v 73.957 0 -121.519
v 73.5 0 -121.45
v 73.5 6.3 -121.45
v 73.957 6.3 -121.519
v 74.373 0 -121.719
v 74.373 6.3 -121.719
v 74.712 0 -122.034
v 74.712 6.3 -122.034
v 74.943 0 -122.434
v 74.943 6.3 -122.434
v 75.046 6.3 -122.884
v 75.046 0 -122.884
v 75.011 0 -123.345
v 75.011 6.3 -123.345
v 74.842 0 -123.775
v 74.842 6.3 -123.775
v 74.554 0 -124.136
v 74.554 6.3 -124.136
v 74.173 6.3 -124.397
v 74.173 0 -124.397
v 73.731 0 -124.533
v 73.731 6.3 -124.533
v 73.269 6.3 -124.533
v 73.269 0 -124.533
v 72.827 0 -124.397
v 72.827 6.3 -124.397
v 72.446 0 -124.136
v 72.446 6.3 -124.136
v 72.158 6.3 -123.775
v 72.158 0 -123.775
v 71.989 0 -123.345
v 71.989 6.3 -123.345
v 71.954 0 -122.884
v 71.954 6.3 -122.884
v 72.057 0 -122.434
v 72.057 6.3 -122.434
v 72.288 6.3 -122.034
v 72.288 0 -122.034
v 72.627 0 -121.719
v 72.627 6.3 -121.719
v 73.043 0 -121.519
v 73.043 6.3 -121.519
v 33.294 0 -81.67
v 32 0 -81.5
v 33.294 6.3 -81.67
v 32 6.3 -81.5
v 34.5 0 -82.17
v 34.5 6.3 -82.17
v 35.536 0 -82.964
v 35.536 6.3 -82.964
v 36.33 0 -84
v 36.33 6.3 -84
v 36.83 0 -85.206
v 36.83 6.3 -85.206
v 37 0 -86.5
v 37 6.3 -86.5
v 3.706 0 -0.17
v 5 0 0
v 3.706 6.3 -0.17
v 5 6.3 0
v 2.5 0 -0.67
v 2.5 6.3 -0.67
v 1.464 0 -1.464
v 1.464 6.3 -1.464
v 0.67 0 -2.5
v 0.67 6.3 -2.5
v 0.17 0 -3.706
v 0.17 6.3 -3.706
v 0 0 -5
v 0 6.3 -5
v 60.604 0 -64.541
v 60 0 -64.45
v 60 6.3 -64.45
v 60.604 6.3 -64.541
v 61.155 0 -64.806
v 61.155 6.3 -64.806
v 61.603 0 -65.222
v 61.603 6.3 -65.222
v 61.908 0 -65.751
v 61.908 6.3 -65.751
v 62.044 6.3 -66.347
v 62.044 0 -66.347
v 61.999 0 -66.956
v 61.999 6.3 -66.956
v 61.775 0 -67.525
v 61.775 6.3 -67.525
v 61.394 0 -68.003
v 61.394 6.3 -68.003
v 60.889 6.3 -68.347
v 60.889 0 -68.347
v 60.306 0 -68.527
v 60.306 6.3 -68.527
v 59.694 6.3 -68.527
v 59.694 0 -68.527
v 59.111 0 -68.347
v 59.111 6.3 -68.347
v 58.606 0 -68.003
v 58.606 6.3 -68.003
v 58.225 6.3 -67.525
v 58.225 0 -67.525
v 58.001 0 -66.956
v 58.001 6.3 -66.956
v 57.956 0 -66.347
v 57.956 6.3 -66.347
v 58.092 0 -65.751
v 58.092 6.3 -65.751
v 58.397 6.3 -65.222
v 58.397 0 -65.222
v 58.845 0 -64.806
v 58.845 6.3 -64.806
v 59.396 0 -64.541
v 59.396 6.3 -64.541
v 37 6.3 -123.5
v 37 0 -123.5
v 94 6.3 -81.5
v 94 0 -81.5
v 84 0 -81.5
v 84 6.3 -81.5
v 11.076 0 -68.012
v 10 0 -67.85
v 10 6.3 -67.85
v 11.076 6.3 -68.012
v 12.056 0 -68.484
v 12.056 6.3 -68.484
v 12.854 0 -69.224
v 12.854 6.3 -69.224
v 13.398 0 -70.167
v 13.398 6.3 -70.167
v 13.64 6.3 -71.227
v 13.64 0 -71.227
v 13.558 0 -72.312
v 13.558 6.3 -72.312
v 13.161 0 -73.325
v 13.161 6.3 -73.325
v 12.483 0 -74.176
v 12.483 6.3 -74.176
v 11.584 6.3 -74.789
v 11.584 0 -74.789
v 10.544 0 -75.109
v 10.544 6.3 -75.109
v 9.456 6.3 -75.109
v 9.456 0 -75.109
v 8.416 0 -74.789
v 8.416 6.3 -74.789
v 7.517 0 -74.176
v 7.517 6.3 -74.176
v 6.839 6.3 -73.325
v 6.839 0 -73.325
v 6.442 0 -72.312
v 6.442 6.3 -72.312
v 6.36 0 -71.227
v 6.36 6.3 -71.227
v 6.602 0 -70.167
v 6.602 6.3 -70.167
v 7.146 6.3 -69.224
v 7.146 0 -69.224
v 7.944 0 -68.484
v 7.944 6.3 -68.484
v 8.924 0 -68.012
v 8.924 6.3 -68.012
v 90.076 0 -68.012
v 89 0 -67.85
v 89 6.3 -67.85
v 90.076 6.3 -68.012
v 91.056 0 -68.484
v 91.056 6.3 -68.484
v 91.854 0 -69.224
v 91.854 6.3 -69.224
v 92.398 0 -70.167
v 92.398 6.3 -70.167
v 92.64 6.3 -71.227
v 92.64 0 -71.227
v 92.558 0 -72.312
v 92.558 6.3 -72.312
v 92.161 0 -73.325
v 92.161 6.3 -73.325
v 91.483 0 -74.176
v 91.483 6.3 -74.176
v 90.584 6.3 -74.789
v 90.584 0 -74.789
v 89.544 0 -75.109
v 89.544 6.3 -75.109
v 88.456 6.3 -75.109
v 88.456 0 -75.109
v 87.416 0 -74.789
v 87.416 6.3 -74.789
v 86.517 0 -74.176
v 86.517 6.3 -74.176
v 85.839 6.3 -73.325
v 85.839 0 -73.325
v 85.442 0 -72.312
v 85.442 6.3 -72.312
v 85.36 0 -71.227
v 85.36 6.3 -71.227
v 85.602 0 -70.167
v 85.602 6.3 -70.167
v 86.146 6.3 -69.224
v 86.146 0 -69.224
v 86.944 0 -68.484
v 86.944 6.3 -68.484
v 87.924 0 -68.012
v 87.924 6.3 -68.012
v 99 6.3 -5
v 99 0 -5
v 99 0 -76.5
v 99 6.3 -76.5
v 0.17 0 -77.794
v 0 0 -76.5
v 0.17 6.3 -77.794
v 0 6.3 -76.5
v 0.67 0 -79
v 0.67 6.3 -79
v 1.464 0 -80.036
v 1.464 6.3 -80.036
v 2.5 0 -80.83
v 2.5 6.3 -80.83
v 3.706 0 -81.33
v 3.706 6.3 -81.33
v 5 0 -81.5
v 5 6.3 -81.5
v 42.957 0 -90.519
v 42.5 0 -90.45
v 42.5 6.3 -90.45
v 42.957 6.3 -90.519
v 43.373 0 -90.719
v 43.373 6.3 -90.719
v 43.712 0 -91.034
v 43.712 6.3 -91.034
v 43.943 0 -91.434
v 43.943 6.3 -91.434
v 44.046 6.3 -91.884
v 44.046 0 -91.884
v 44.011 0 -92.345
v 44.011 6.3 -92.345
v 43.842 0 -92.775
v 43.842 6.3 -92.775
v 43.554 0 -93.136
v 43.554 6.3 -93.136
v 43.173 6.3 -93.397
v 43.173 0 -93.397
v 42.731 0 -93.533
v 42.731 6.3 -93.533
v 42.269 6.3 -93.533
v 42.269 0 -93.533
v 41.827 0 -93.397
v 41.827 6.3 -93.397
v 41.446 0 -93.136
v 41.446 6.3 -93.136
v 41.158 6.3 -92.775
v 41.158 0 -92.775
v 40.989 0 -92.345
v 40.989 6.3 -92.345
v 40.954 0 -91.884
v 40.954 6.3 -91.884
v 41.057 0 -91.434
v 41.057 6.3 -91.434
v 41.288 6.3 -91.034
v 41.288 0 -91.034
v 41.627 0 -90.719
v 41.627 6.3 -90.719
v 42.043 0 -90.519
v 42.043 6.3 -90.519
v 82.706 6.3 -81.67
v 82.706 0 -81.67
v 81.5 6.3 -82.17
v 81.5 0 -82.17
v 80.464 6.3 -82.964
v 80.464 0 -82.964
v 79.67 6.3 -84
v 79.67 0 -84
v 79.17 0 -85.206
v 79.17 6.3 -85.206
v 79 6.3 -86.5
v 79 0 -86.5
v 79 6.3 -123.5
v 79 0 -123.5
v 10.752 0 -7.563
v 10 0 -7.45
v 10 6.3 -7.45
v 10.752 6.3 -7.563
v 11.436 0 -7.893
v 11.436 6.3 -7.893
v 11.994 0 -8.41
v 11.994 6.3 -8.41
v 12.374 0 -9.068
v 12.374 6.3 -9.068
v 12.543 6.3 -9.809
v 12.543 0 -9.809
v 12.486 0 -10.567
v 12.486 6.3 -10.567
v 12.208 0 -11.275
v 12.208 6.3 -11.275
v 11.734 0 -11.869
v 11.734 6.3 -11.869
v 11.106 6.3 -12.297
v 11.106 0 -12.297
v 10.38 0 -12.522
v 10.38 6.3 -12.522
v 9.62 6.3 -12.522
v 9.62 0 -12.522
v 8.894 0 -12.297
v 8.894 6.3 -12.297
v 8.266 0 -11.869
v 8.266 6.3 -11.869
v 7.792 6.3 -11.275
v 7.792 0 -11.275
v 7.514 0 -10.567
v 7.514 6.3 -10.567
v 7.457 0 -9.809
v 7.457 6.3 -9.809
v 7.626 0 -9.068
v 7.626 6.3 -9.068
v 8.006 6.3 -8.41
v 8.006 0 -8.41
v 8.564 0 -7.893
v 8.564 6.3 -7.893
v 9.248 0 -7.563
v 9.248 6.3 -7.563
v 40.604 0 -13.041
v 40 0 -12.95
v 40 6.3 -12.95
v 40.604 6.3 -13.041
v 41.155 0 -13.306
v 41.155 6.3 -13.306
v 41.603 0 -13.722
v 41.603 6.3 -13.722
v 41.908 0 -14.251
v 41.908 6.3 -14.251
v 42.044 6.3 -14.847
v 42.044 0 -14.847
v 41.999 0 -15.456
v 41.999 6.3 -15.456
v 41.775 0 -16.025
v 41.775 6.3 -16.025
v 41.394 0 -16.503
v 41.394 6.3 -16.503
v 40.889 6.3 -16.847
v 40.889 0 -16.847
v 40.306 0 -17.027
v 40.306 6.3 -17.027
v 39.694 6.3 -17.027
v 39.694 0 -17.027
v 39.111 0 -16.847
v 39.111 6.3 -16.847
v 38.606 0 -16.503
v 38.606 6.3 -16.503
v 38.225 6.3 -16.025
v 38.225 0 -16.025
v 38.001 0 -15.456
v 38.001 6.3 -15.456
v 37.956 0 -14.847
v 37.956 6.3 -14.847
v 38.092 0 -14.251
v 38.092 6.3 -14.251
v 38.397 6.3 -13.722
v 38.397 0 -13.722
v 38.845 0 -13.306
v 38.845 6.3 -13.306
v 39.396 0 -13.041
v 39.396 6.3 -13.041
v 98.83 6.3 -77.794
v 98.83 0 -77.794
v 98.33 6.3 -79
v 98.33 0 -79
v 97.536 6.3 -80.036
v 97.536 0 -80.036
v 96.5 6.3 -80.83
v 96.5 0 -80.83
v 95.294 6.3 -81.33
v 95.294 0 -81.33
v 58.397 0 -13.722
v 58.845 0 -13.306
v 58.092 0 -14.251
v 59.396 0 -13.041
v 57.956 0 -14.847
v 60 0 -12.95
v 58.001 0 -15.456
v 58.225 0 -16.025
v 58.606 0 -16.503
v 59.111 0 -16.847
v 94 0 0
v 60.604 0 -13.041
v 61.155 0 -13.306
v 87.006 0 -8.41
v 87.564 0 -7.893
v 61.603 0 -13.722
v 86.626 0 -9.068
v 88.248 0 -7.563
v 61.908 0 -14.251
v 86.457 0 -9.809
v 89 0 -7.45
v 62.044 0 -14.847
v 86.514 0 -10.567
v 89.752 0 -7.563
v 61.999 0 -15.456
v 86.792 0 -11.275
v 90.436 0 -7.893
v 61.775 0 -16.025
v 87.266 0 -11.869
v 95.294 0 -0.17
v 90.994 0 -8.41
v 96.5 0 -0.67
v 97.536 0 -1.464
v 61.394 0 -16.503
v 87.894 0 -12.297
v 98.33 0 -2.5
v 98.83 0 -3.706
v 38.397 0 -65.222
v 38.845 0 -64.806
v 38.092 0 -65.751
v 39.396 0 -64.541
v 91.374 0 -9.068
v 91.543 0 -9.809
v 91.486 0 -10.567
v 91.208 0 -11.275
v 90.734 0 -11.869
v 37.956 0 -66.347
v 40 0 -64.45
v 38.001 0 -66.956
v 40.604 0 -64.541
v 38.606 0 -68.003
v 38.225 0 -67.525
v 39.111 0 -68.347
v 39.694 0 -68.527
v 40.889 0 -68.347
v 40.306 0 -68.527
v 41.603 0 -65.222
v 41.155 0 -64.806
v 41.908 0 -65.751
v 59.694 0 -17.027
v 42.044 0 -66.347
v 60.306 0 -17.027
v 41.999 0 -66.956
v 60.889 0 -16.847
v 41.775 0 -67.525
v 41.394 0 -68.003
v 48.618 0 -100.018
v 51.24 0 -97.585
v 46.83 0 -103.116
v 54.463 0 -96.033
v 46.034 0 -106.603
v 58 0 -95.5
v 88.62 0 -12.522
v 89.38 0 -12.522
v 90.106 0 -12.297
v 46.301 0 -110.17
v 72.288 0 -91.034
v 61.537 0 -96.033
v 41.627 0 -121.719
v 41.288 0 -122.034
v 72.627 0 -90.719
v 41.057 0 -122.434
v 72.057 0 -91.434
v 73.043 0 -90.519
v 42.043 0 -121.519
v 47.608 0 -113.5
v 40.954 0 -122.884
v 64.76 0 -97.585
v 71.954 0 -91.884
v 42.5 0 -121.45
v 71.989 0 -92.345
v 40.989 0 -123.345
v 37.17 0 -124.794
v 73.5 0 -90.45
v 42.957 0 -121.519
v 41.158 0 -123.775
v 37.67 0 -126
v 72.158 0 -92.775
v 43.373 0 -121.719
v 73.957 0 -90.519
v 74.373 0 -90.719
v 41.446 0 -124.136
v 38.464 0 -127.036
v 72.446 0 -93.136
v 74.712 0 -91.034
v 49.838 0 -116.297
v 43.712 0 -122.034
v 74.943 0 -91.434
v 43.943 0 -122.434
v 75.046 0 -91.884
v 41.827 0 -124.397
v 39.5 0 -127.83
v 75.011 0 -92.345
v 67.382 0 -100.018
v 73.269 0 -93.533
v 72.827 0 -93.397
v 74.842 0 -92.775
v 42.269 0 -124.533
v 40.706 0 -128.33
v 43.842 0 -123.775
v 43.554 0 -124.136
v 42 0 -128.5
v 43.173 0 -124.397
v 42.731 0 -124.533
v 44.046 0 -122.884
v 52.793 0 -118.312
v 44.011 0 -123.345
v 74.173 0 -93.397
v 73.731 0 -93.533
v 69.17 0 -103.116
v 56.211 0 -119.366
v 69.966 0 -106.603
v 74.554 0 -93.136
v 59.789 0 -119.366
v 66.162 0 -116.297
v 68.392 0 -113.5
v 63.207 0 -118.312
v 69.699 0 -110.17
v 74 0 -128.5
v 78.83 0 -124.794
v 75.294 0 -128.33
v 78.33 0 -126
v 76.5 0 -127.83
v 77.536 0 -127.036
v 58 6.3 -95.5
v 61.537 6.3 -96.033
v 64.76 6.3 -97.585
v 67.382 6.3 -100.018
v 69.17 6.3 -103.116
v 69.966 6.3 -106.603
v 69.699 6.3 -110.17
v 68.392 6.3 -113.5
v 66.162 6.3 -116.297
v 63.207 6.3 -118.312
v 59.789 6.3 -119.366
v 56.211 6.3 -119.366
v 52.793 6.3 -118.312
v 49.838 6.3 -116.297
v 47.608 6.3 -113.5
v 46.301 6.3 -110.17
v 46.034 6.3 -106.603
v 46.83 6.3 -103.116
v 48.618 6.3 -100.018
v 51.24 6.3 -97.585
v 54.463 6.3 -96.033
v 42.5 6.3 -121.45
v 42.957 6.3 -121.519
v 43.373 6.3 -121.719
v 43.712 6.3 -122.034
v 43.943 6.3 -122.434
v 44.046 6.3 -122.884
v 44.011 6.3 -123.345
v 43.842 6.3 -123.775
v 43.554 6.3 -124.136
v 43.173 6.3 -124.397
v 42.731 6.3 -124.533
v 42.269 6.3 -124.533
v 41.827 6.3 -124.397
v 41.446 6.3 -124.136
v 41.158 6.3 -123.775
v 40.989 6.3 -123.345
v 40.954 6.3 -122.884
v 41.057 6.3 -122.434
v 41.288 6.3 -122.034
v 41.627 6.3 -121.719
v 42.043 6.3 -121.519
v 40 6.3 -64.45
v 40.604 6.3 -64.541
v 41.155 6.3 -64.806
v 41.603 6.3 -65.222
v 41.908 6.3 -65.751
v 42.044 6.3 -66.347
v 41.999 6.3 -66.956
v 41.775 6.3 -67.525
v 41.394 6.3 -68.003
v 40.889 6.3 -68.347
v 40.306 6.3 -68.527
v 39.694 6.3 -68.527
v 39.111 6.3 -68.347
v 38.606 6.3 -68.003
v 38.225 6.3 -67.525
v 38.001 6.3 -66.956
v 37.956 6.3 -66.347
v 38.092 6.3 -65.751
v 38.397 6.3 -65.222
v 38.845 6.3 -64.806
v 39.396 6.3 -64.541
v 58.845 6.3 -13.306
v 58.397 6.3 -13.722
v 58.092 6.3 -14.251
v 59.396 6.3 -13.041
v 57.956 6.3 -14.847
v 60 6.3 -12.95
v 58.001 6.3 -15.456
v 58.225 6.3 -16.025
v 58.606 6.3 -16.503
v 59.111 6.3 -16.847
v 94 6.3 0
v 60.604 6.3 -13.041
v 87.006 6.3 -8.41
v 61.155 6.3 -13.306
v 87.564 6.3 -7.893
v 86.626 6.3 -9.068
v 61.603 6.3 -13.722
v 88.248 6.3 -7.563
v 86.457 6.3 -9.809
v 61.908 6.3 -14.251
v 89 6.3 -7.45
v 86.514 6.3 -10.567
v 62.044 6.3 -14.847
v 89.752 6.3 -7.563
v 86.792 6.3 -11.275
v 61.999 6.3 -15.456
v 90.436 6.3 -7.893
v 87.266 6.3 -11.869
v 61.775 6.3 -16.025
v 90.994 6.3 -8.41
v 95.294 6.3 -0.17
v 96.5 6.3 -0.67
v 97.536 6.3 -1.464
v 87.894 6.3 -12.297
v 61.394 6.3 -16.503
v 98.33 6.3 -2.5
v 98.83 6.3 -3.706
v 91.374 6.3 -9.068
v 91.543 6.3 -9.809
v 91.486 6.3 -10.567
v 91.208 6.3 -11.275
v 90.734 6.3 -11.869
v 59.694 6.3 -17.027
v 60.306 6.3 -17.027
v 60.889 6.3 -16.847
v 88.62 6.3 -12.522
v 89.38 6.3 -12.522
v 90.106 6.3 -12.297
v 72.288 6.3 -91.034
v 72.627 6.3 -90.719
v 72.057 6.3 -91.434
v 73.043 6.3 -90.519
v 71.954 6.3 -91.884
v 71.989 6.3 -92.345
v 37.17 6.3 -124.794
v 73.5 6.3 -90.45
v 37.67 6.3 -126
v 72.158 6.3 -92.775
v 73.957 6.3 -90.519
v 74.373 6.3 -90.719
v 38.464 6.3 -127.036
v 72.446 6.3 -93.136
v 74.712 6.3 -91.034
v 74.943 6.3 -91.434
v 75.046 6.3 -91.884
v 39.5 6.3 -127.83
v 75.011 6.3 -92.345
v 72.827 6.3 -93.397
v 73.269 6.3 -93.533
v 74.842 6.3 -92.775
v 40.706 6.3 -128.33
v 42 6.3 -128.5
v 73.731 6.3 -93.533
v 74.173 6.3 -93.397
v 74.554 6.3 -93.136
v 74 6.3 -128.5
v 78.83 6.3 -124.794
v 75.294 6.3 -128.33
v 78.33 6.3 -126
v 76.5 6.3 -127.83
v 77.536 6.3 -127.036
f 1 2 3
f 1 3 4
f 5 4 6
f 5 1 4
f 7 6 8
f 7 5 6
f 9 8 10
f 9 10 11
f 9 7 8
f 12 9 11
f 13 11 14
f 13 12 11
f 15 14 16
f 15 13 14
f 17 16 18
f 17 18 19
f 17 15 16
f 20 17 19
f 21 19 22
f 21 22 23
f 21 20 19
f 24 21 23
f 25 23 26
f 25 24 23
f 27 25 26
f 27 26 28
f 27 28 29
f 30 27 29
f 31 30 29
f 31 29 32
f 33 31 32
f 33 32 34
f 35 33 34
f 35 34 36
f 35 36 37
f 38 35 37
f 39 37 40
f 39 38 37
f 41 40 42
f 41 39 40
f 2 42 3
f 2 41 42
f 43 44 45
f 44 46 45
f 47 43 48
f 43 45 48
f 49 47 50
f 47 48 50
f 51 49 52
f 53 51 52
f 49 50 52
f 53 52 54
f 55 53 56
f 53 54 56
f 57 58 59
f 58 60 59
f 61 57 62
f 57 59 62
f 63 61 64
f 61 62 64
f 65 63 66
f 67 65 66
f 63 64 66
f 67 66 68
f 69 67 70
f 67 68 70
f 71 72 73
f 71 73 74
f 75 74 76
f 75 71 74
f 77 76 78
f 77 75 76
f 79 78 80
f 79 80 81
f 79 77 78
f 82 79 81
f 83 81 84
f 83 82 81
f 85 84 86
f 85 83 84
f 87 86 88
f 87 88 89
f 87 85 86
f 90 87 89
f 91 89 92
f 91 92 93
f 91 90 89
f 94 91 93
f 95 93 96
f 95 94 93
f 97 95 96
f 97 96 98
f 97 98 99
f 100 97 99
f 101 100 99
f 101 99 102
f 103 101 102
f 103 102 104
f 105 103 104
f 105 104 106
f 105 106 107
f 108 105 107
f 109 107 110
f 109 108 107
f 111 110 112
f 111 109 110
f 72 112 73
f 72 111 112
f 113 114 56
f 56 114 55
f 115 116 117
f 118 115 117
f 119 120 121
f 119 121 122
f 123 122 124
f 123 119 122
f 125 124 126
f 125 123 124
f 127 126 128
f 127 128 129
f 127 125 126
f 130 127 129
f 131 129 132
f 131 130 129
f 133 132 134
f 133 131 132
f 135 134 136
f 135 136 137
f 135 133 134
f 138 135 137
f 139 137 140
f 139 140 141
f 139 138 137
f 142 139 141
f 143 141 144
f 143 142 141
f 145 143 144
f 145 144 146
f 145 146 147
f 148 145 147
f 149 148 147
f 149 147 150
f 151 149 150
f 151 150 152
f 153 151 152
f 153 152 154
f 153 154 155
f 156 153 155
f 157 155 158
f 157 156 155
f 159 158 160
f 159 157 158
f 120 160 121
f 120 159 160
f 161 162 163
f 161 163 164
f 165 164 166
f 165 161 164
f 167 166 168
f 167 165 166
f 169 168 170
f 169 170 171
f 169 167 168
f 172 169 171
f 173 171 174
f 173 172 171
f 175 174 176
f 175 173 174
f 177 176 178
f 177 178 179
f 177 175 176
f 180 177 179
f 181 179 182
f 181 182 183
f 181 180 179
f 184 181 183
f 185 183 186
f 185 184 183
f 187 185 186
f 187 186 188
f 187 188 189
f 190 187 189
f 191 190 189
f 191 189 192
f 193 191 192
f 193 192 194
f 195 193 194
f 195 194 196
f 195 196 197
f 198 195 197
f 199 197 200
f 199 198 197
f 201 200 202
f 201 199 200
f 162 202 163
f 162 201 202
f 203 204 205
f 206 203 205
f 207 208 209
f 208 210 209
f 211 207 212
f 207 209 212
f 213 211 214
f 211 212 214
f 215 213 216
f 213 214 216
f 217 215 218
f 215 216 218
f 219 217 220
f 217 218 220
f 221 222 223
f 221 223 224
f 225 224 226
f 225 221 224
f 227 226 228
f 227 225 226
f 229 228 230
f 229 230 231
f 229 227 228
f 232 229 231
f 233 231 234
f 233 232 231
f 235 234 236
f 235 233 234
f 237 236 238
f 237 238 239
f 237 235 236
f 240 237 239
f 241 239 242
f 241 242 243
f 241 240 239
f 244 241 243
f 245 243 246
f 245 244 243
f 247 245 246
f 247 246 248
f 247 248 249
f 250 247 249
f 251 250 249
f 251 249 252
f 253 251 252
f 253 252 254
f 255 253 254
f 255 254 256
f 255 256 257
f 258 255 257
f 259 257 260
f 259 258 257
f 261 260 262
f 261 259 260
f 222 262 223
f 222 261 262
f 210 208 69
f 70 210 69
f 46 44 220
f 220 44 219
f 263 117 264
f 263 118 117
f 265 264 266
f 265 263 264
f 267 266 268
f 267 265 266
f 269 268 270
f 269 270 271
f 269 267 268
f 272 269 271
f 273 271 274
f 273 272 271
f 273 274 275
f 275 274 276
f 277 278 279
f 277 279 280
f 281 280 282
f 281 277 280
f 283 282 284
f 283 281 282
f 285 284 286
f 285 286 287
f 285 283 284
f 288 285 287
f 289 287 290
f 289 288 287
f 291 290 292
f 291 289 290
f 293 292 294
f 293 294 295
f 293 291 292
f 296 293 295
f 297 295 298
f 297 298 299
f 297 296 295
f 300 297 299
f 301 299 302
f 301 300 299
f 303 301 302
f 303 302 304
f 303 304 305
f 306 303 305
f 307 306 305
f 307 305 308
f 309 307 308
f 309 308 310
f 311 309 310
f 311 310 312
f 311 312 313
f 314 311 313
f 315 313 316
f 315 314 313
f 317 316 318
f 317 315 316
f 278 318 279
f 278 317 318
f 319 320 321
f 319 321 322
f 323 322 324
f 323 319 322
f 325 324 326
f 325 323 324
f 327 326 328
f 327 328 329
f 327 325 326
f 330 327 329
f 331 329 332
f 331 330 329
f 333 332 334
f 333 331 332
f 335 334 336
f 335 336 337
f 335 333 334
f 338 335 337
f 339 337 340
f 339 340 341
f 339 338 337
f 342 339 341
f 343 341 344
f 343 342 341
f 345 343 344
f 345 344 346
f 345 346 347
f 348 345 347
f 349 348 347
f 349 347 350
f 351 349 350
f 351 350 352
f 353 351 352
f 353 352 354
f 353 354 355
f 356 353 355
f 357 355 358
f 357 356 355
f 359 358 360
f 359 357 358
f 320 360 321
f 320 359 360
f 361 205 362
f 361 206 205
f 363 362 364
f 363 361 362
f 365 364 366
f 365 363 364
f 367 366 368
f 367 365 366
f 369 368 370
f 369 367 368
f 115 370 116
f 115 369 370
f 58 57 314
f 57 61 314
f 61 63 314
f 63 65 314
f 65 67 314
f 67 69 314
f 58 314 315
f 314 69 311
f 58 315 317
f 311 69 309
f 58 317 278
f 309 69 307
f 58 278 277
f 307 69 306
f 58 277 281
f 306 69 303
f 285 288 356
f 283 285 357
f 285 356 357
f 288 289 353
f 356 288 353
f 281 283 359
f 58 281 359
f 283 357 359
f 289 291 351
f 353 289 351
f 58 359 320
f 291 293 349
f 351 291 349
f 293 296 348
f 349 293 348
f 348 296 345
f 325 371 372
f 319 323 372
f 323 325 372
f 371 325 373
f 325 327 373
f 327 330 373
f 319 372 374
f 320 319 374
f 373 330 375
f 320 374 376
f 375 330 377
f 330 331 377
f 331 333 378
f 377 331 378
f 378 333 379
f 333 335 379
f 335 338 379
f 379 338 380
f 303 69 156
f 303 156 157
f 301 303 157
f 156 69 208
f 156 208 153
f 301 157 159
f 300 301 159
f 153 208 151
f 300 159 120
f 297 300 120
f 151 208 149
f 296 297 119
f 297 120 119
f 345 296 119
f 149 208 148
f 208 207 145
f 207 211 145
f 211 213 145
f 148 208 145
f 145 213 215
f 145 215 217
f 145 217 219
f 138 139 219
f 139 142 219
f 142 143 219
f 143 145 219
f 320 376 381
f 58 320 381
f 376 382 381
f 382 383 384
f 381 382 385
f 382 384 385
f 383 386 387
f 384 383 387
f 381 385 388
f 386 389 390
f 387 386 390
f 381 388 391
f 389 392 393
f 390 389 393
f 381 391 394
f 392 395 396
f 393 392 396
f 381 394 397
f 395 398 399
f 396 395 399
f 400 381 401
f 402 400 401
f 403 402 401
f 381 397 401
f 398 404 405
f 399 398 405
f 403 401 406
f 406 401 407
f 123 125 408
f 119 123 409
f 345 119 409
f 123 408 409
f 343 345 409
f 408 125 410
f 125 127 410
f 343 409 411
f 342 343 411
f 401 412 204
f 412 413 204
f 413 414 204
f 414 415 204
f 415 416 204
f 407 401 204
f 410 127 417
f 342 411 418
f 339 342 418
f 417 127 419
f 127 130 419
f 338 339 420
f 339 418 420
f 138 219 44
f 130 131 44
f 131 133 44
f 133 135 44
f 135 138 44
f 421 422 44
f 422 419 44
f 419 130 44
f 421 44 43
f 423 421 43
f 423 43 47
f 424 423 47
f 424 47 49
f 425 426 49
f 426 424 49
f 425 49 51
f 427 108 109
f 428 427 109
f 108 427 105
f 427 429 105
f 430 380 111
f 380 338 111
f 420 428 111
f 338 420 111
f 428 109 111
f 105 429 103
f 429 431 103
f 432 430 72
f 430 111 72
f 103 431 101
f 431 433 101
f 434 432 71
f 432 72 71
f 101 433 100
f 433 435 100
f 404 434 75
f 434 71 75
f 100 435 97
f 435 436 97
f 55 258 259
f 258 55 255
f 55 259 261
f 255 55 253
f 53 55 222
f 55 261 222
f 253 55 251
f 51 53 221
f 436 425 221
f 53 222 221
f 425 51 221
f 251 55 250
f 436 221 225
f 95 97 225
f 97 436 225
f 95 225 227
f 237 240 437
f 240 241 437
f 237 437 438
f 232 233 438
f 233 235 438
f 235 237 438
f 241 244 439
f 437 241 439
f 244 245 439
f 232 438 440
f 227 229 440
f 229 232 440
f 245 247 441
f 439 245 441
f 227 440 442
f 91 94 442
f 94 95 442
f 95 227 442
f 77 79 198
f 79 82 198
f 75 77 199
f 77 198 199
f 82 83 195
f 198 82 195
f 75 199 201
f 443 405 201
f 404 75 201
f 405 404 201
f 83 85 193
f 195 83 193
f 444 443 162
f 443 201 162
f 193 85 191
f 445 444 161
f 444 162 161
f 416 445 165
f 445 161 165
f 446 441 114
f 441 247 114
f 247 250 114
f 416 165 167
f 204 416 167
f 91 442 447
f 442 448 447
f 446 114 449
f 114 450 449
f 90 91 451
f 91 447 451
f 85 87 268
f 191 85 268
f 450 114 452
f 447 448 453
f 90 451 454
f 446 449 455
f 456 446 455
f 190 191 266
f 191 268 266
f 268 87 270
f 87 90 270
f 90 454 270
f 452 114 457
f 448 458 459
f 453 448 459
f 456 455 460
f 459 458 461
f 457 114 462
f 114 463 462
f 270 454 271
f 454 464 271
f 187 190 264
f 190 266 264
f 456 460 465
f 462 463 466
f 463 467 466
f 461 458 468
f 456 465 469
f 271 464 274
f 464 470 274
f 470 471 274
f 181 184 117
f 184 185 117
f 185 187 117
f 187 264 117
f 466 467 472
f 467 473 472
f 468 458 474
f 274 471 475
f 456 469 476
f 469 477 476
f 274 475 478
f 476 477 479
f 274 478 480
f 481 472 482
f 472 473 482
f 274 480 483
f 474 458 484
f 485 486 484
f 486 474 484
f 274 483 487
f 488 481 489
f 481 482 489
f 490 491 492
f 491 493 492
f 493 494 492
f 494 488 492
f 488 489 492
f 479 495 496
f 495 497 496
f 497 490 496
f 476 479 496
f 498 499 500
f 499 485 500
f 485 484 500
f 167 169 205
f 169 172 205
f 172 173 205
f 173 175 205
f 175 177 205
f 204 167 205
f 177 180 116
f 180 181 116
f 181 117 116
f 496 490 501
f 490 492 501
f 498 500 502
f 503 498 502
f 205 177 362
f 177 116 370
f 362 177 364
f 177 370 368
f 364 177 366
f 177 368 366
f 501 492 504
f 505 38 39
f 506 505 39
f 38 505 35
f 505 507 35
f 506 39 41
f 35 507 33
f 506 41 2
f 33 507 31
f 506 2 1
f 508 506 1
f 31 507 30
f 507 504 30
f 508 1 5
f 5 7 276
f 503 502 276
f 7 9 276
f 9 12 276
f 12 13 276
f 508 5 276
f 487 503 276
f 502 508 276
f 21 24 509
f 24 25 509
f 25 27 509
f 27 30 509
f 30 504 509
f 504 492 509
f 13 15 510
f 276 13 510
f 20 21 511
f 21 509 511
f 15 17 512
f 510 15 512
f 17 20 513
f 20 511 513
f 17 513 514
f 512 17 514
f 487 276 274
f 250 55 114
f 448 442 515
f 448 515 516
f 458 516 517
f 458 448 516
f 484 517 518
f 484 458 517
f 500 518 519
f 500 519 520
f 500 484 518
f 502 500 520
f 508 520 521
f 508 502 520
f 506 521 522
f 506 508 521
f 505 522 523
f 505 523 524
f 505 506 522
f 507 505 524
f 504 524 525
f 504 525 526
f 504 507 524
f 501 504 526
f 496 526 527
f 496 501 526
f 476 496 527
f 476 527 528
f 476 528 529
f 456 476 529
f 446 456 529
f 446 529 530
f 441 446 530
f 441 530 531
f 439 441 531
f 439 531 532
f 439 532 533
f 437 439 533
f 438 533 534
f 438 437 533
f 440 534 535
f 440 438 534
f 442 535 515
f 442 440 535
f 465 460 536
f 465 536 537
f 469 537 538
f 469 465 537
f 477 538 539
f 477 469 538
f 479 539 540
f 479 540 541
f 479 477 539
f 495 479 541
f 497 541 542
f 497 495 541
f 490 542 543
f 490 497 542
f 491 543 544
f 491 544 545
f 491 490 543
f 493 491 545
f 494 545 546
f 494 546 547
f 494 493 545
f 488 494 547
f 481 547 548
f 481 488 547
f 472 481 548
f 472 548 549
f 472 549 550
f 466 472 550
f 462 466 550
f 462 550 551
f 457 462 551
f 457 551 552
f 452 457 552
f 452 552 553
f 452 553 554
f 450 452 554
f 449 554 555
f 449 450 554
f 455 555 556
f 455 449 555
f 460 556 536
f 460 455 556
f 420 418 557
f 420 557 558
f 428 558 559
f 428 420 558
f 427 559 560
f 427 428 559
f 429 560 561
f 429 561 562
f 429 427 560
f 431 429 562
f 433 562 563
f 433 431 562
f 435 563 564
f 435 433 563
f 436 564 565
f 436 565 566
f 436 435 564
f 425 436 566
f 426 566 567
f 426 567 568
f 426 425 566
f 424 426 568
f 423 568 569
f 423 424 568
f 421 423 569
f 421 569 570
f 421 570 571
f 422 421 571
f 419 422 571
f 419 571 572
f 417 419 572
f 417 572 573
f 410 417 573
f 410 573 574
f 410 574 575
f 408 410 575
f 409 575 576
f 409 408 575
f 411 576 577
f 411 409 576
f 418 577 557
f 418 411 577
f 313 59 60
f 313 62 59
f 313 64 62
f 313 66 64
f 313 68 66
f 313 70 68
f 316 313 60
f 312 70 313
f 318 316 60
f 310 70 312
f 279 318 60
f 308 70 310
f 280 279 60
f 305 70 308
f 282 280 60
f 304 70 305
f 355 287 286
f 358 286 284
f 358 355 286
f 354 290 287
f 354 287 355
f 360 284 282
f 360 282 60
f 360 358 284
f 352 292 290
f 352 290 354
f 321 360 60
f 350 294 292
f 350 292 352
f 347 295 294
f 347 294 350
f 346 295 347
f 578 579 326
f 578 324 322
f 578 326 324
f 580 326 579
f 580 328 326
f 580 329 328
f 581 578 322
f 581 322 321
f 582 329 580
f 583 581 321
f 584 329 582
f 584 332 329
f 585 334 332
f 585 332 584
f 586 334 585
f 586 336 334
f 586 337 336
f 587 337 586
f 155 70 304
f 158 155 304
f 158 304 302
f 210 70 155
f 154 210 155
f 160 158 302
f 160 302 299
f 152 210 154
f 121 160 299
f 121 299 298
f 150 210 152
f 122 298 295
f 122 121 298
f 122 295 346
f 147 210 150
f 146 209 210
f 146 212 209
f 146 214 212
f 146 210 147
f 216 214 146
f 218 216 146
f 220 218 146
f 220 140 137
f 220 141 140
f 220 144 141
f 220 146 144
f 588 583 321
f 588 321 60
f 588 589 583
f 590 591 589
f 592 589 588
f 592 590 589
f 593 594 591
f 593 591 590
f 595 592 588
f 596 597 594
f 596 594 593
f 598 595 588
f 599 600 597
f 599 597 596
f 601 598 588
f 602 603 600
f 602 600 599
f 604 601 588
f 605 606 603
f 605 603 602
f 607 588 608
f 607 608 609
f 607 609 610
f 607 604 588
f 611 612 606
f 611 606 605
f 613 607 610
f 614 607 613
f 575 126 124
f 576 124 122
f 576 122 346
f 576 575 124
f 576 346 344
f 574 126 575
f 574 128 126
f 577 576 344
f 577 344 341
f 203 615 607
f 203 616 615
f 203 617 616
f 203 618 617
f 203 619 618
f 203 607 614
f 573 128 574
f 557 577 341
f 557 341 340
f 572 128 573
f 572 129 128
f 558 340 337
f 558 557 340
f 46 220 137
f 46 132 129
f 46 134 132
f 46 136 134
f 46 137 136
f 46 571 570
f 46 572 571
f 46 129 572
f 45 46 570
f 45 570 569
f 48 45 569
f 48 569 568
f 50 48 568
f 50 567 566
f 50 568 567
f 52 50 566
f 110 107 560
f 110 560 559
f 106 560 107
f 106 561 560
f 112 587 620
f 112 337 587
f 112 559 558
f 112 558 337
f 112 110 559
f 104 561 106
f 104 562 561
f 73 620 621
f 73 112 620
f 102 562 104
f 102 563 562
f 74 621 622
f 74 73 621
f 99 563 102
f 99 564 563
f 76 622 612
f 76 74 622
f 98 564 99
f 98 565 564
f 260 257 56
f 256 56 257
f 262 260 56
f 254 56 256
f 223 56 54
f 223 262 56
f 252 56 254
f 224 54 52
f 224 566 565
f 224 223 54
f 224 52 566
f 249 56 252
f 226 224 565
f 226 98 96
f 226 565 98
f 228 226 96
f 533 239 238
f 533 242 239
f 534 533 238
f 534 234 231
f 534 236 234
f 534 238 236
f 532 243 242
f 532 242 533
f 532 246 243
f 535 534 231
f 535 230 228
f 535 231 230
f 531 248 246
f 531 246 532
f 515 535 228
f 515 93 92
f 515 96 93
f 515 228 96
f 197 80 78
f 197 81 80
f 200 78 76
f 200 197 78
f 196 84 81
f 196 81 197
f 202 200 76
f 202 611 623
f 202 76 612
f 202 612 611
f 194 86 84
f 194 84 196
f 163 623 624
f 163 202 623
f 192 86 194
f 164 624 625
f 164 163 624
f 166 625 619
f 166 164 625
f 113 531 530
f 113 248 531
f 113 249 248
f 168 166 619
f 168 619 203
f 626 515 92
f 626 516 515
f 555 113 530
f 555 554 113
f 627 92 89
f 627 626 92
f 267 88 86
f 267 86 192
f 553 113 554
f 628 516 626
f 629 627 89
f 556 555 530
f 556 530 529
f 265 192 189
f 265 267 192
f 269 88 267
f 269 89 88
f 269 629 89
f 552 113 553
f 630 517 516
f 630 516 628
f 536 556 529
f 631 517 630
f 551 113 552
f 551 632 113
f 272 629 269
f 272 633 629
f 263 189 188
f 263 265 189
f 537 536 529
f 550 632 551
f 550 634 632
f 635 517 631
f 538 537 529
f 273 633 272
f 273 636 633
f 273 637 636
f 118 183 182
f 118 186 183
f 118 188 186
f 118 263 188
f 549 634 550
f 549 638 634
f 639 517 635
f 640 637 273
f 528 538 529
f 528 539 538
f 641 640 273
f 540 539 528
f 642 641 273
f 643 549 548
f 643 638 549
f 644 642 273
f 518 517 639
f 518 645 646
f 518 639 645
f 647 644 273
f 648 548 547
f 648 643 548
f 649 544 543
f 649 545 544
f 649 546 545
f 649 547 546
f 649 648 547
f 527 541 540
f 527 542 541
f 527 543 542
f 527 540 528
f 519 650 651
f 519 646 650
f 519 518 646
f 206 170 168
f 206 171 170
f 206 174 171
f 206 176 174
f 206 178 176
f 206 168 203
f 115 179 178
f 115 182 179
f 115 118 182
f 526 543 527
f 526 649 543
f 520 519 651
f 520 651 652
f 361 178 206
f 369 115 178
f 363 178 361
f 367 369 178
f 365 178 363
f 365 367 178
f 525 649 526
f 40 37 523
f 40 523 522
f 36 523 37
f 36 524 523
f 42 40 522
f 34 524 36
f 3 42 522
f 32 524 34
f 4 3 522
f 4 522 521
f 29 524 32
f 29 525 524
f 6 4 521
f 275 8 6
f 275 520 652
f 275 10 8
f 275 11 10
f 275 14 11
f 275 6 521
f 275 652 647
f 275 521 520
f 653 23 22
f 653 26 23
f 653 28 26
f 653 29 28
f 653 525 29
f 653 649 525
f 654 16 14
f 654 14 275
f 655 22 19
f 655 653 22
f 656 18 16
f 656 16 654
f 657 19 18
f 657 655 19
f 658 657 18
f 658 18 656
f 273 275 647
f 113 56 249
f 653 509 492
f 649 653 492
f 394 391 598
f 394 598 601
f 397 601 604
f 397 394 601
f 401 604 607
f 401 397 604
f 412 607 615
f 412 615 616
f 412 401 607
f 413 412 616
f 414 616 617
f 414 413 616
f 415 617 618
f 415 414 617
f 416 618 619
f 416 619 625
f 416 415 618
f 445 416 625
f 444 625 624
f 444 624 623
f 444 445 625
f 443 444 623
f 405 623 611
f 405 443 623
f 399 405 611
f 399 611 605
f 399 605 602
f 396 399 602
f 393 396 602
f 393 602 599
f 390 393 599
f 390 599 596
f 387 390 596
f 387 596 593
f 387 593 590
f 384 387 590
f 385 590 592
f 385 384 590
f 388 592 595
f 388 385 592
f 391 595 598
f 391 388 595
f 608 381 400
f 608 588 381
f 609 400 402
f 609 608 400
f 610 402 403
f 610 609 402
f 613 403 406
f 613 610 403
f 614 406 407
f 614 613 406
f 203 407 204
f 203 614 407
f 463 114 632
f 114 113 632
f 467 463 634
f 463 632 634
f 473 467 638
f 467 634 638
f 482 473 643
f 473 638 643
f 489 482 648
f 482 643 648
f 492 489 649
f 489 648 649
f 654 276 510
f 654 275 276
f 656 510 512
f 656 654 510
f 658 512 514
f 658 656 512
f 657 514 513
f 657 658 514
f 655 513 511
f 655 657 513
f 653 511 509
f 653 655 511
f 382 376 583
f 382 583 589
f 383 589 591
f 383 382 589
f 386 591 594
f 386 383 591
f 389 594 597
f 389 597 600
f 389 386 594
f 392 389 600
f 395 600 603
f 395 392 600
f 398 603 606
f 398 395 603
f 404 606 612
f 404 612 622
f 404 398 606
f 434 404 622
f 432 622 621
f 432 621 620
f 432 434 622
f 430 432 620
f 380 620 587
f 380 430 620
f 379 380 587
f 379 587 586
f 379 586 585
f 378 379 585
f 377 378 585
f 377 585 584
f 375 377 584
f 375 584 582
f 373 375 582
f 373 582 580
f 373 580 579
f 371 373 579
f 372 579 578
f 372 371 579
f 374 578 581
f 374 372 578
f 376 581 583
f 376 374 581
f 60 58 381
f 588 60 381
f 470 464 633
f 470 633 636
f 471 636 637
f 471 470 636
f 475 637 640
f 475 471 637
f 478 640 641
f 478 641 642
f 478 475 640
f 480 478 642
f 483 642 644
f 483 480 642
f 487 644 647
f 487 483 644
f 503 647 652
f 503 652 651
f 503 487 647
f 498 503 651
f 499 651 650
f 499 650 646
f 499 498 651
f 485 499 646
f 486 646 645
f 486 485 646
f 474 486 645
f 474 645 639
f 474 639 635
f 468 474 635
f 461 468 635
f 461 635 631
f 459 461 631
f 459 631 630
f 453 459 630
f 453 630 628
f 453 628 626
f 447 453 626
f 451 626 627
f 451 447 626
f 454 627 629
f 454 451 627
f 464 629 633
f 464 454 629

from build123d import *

# Parameters (mm, degrees)
SKETCH1_R           = 12
SKETCH1_R_2         = 1.55
SKETCH1_R_3         = 3.65
SKETCH1_R_4         = 2.55
SKETCH1_R_5         = 2.05
BOSS_EXTRUDE1_DEPTH = 6.3
FILLET1_R           = 5


with BuildPart() as part:
    # Sketch1 → Boss-Extrude1 (new body)
    with BuildSketch(Plane(origin=(0, 0, 0), x_dir=(1, 0, 0), z_dir=(0, 1, 0))):
        Polygon((0, 0), (99, 0), (99, 81.5), (79, 81.5), (79, 128.5), (37, 128.5), (37, 81.5), (0, 81.5), align=None)
        with Locations(Location((58, 107.5, 0), (0, 0, 270))):
            Circle(SKETCH1_R, mode=Mode.SUBTRACT)
        with Locations(Location((42.5, 123, 0), (0, 0, 270))):
            Circle(SKETCH1_R_2, mode=Mode.SUBTRACT)
        with Locations(Location((73.5, 123, 0), (0, 0, 270))):
            Circle(SKETCH1_R_2, mode=Mode.SUBTRACT)
        with Locations(Location((73.5, 92, 0), (0, 0, 270))):
            Circle(SKETCH1_R_2, mode=Mode.SUBTRACT)
        with Locations(Location((42.5, 92, 0), (0, 0, 270))):
            Circle(SKETCH1_R_2, mode=Mode.SUBTRACT)
        with Locations(Location((10, 71.5, 0), (0, 0, 270))):
            Circle(SKETCH1_R_3, mode=Mode.SUBTRACT)
        with Locations(Location((89, 71.5, 0), (0, 0, 270))):
            Circle(SKETCH1_R_3, mode=Mode.SUBTRACT)
        with Locations(Location((89, 10, 0), (0, 0, 270))):
            Circle(SKETCH1_R_4, mode=Mode.SUBTRACT)
        with Locations(Location((10, 10, 0), (0, 0, 270))):
            Circle(SKETCH1_R_4, mode=Mode.SUBTRACT)
        with Locations(Location((40, 66.5, 0), (0, 0, 270))):
            Circle(SKETCH1_R_5, mode=Mode.SUBTRACT)
        with Locations(Location((60, 66.5, 0), (0, 0, 270))):
            Circle(SKETCH1_R_5, mode=Mode.SUBTRACT)
        with Locations(Location((60, 15, 0), (0, 0, 270))):
            Circle(SKETCH1_R_5, mode=Mode.SUBTRACT)
        with Locations(Location((40, 15, 0), (0, 0, 270))):
            Circle(SKETCH1_R_5, mode=Mode.SUBTRACT)
    extrude(amount=BOSS_EXTRUDE1_DEPTH)

    # Fillet1
    fillet1_edges = [part.edges().sort_by_distance(p)[0] for p in [
        (0, 3.15, -81.5),
        (37, 3.15, -81.5),
        (37, 3.15, -128.5),
        (79, 3.15, -128.5),
        (79, 3.15, -81.5),
        (99, 3.15, -81.5),
        (99, 3.15, 0),
        (0, 3.15, 0),
    ]]
    fillet(fillet1_edges, radius=FILLET1_R)


solid = part.part
